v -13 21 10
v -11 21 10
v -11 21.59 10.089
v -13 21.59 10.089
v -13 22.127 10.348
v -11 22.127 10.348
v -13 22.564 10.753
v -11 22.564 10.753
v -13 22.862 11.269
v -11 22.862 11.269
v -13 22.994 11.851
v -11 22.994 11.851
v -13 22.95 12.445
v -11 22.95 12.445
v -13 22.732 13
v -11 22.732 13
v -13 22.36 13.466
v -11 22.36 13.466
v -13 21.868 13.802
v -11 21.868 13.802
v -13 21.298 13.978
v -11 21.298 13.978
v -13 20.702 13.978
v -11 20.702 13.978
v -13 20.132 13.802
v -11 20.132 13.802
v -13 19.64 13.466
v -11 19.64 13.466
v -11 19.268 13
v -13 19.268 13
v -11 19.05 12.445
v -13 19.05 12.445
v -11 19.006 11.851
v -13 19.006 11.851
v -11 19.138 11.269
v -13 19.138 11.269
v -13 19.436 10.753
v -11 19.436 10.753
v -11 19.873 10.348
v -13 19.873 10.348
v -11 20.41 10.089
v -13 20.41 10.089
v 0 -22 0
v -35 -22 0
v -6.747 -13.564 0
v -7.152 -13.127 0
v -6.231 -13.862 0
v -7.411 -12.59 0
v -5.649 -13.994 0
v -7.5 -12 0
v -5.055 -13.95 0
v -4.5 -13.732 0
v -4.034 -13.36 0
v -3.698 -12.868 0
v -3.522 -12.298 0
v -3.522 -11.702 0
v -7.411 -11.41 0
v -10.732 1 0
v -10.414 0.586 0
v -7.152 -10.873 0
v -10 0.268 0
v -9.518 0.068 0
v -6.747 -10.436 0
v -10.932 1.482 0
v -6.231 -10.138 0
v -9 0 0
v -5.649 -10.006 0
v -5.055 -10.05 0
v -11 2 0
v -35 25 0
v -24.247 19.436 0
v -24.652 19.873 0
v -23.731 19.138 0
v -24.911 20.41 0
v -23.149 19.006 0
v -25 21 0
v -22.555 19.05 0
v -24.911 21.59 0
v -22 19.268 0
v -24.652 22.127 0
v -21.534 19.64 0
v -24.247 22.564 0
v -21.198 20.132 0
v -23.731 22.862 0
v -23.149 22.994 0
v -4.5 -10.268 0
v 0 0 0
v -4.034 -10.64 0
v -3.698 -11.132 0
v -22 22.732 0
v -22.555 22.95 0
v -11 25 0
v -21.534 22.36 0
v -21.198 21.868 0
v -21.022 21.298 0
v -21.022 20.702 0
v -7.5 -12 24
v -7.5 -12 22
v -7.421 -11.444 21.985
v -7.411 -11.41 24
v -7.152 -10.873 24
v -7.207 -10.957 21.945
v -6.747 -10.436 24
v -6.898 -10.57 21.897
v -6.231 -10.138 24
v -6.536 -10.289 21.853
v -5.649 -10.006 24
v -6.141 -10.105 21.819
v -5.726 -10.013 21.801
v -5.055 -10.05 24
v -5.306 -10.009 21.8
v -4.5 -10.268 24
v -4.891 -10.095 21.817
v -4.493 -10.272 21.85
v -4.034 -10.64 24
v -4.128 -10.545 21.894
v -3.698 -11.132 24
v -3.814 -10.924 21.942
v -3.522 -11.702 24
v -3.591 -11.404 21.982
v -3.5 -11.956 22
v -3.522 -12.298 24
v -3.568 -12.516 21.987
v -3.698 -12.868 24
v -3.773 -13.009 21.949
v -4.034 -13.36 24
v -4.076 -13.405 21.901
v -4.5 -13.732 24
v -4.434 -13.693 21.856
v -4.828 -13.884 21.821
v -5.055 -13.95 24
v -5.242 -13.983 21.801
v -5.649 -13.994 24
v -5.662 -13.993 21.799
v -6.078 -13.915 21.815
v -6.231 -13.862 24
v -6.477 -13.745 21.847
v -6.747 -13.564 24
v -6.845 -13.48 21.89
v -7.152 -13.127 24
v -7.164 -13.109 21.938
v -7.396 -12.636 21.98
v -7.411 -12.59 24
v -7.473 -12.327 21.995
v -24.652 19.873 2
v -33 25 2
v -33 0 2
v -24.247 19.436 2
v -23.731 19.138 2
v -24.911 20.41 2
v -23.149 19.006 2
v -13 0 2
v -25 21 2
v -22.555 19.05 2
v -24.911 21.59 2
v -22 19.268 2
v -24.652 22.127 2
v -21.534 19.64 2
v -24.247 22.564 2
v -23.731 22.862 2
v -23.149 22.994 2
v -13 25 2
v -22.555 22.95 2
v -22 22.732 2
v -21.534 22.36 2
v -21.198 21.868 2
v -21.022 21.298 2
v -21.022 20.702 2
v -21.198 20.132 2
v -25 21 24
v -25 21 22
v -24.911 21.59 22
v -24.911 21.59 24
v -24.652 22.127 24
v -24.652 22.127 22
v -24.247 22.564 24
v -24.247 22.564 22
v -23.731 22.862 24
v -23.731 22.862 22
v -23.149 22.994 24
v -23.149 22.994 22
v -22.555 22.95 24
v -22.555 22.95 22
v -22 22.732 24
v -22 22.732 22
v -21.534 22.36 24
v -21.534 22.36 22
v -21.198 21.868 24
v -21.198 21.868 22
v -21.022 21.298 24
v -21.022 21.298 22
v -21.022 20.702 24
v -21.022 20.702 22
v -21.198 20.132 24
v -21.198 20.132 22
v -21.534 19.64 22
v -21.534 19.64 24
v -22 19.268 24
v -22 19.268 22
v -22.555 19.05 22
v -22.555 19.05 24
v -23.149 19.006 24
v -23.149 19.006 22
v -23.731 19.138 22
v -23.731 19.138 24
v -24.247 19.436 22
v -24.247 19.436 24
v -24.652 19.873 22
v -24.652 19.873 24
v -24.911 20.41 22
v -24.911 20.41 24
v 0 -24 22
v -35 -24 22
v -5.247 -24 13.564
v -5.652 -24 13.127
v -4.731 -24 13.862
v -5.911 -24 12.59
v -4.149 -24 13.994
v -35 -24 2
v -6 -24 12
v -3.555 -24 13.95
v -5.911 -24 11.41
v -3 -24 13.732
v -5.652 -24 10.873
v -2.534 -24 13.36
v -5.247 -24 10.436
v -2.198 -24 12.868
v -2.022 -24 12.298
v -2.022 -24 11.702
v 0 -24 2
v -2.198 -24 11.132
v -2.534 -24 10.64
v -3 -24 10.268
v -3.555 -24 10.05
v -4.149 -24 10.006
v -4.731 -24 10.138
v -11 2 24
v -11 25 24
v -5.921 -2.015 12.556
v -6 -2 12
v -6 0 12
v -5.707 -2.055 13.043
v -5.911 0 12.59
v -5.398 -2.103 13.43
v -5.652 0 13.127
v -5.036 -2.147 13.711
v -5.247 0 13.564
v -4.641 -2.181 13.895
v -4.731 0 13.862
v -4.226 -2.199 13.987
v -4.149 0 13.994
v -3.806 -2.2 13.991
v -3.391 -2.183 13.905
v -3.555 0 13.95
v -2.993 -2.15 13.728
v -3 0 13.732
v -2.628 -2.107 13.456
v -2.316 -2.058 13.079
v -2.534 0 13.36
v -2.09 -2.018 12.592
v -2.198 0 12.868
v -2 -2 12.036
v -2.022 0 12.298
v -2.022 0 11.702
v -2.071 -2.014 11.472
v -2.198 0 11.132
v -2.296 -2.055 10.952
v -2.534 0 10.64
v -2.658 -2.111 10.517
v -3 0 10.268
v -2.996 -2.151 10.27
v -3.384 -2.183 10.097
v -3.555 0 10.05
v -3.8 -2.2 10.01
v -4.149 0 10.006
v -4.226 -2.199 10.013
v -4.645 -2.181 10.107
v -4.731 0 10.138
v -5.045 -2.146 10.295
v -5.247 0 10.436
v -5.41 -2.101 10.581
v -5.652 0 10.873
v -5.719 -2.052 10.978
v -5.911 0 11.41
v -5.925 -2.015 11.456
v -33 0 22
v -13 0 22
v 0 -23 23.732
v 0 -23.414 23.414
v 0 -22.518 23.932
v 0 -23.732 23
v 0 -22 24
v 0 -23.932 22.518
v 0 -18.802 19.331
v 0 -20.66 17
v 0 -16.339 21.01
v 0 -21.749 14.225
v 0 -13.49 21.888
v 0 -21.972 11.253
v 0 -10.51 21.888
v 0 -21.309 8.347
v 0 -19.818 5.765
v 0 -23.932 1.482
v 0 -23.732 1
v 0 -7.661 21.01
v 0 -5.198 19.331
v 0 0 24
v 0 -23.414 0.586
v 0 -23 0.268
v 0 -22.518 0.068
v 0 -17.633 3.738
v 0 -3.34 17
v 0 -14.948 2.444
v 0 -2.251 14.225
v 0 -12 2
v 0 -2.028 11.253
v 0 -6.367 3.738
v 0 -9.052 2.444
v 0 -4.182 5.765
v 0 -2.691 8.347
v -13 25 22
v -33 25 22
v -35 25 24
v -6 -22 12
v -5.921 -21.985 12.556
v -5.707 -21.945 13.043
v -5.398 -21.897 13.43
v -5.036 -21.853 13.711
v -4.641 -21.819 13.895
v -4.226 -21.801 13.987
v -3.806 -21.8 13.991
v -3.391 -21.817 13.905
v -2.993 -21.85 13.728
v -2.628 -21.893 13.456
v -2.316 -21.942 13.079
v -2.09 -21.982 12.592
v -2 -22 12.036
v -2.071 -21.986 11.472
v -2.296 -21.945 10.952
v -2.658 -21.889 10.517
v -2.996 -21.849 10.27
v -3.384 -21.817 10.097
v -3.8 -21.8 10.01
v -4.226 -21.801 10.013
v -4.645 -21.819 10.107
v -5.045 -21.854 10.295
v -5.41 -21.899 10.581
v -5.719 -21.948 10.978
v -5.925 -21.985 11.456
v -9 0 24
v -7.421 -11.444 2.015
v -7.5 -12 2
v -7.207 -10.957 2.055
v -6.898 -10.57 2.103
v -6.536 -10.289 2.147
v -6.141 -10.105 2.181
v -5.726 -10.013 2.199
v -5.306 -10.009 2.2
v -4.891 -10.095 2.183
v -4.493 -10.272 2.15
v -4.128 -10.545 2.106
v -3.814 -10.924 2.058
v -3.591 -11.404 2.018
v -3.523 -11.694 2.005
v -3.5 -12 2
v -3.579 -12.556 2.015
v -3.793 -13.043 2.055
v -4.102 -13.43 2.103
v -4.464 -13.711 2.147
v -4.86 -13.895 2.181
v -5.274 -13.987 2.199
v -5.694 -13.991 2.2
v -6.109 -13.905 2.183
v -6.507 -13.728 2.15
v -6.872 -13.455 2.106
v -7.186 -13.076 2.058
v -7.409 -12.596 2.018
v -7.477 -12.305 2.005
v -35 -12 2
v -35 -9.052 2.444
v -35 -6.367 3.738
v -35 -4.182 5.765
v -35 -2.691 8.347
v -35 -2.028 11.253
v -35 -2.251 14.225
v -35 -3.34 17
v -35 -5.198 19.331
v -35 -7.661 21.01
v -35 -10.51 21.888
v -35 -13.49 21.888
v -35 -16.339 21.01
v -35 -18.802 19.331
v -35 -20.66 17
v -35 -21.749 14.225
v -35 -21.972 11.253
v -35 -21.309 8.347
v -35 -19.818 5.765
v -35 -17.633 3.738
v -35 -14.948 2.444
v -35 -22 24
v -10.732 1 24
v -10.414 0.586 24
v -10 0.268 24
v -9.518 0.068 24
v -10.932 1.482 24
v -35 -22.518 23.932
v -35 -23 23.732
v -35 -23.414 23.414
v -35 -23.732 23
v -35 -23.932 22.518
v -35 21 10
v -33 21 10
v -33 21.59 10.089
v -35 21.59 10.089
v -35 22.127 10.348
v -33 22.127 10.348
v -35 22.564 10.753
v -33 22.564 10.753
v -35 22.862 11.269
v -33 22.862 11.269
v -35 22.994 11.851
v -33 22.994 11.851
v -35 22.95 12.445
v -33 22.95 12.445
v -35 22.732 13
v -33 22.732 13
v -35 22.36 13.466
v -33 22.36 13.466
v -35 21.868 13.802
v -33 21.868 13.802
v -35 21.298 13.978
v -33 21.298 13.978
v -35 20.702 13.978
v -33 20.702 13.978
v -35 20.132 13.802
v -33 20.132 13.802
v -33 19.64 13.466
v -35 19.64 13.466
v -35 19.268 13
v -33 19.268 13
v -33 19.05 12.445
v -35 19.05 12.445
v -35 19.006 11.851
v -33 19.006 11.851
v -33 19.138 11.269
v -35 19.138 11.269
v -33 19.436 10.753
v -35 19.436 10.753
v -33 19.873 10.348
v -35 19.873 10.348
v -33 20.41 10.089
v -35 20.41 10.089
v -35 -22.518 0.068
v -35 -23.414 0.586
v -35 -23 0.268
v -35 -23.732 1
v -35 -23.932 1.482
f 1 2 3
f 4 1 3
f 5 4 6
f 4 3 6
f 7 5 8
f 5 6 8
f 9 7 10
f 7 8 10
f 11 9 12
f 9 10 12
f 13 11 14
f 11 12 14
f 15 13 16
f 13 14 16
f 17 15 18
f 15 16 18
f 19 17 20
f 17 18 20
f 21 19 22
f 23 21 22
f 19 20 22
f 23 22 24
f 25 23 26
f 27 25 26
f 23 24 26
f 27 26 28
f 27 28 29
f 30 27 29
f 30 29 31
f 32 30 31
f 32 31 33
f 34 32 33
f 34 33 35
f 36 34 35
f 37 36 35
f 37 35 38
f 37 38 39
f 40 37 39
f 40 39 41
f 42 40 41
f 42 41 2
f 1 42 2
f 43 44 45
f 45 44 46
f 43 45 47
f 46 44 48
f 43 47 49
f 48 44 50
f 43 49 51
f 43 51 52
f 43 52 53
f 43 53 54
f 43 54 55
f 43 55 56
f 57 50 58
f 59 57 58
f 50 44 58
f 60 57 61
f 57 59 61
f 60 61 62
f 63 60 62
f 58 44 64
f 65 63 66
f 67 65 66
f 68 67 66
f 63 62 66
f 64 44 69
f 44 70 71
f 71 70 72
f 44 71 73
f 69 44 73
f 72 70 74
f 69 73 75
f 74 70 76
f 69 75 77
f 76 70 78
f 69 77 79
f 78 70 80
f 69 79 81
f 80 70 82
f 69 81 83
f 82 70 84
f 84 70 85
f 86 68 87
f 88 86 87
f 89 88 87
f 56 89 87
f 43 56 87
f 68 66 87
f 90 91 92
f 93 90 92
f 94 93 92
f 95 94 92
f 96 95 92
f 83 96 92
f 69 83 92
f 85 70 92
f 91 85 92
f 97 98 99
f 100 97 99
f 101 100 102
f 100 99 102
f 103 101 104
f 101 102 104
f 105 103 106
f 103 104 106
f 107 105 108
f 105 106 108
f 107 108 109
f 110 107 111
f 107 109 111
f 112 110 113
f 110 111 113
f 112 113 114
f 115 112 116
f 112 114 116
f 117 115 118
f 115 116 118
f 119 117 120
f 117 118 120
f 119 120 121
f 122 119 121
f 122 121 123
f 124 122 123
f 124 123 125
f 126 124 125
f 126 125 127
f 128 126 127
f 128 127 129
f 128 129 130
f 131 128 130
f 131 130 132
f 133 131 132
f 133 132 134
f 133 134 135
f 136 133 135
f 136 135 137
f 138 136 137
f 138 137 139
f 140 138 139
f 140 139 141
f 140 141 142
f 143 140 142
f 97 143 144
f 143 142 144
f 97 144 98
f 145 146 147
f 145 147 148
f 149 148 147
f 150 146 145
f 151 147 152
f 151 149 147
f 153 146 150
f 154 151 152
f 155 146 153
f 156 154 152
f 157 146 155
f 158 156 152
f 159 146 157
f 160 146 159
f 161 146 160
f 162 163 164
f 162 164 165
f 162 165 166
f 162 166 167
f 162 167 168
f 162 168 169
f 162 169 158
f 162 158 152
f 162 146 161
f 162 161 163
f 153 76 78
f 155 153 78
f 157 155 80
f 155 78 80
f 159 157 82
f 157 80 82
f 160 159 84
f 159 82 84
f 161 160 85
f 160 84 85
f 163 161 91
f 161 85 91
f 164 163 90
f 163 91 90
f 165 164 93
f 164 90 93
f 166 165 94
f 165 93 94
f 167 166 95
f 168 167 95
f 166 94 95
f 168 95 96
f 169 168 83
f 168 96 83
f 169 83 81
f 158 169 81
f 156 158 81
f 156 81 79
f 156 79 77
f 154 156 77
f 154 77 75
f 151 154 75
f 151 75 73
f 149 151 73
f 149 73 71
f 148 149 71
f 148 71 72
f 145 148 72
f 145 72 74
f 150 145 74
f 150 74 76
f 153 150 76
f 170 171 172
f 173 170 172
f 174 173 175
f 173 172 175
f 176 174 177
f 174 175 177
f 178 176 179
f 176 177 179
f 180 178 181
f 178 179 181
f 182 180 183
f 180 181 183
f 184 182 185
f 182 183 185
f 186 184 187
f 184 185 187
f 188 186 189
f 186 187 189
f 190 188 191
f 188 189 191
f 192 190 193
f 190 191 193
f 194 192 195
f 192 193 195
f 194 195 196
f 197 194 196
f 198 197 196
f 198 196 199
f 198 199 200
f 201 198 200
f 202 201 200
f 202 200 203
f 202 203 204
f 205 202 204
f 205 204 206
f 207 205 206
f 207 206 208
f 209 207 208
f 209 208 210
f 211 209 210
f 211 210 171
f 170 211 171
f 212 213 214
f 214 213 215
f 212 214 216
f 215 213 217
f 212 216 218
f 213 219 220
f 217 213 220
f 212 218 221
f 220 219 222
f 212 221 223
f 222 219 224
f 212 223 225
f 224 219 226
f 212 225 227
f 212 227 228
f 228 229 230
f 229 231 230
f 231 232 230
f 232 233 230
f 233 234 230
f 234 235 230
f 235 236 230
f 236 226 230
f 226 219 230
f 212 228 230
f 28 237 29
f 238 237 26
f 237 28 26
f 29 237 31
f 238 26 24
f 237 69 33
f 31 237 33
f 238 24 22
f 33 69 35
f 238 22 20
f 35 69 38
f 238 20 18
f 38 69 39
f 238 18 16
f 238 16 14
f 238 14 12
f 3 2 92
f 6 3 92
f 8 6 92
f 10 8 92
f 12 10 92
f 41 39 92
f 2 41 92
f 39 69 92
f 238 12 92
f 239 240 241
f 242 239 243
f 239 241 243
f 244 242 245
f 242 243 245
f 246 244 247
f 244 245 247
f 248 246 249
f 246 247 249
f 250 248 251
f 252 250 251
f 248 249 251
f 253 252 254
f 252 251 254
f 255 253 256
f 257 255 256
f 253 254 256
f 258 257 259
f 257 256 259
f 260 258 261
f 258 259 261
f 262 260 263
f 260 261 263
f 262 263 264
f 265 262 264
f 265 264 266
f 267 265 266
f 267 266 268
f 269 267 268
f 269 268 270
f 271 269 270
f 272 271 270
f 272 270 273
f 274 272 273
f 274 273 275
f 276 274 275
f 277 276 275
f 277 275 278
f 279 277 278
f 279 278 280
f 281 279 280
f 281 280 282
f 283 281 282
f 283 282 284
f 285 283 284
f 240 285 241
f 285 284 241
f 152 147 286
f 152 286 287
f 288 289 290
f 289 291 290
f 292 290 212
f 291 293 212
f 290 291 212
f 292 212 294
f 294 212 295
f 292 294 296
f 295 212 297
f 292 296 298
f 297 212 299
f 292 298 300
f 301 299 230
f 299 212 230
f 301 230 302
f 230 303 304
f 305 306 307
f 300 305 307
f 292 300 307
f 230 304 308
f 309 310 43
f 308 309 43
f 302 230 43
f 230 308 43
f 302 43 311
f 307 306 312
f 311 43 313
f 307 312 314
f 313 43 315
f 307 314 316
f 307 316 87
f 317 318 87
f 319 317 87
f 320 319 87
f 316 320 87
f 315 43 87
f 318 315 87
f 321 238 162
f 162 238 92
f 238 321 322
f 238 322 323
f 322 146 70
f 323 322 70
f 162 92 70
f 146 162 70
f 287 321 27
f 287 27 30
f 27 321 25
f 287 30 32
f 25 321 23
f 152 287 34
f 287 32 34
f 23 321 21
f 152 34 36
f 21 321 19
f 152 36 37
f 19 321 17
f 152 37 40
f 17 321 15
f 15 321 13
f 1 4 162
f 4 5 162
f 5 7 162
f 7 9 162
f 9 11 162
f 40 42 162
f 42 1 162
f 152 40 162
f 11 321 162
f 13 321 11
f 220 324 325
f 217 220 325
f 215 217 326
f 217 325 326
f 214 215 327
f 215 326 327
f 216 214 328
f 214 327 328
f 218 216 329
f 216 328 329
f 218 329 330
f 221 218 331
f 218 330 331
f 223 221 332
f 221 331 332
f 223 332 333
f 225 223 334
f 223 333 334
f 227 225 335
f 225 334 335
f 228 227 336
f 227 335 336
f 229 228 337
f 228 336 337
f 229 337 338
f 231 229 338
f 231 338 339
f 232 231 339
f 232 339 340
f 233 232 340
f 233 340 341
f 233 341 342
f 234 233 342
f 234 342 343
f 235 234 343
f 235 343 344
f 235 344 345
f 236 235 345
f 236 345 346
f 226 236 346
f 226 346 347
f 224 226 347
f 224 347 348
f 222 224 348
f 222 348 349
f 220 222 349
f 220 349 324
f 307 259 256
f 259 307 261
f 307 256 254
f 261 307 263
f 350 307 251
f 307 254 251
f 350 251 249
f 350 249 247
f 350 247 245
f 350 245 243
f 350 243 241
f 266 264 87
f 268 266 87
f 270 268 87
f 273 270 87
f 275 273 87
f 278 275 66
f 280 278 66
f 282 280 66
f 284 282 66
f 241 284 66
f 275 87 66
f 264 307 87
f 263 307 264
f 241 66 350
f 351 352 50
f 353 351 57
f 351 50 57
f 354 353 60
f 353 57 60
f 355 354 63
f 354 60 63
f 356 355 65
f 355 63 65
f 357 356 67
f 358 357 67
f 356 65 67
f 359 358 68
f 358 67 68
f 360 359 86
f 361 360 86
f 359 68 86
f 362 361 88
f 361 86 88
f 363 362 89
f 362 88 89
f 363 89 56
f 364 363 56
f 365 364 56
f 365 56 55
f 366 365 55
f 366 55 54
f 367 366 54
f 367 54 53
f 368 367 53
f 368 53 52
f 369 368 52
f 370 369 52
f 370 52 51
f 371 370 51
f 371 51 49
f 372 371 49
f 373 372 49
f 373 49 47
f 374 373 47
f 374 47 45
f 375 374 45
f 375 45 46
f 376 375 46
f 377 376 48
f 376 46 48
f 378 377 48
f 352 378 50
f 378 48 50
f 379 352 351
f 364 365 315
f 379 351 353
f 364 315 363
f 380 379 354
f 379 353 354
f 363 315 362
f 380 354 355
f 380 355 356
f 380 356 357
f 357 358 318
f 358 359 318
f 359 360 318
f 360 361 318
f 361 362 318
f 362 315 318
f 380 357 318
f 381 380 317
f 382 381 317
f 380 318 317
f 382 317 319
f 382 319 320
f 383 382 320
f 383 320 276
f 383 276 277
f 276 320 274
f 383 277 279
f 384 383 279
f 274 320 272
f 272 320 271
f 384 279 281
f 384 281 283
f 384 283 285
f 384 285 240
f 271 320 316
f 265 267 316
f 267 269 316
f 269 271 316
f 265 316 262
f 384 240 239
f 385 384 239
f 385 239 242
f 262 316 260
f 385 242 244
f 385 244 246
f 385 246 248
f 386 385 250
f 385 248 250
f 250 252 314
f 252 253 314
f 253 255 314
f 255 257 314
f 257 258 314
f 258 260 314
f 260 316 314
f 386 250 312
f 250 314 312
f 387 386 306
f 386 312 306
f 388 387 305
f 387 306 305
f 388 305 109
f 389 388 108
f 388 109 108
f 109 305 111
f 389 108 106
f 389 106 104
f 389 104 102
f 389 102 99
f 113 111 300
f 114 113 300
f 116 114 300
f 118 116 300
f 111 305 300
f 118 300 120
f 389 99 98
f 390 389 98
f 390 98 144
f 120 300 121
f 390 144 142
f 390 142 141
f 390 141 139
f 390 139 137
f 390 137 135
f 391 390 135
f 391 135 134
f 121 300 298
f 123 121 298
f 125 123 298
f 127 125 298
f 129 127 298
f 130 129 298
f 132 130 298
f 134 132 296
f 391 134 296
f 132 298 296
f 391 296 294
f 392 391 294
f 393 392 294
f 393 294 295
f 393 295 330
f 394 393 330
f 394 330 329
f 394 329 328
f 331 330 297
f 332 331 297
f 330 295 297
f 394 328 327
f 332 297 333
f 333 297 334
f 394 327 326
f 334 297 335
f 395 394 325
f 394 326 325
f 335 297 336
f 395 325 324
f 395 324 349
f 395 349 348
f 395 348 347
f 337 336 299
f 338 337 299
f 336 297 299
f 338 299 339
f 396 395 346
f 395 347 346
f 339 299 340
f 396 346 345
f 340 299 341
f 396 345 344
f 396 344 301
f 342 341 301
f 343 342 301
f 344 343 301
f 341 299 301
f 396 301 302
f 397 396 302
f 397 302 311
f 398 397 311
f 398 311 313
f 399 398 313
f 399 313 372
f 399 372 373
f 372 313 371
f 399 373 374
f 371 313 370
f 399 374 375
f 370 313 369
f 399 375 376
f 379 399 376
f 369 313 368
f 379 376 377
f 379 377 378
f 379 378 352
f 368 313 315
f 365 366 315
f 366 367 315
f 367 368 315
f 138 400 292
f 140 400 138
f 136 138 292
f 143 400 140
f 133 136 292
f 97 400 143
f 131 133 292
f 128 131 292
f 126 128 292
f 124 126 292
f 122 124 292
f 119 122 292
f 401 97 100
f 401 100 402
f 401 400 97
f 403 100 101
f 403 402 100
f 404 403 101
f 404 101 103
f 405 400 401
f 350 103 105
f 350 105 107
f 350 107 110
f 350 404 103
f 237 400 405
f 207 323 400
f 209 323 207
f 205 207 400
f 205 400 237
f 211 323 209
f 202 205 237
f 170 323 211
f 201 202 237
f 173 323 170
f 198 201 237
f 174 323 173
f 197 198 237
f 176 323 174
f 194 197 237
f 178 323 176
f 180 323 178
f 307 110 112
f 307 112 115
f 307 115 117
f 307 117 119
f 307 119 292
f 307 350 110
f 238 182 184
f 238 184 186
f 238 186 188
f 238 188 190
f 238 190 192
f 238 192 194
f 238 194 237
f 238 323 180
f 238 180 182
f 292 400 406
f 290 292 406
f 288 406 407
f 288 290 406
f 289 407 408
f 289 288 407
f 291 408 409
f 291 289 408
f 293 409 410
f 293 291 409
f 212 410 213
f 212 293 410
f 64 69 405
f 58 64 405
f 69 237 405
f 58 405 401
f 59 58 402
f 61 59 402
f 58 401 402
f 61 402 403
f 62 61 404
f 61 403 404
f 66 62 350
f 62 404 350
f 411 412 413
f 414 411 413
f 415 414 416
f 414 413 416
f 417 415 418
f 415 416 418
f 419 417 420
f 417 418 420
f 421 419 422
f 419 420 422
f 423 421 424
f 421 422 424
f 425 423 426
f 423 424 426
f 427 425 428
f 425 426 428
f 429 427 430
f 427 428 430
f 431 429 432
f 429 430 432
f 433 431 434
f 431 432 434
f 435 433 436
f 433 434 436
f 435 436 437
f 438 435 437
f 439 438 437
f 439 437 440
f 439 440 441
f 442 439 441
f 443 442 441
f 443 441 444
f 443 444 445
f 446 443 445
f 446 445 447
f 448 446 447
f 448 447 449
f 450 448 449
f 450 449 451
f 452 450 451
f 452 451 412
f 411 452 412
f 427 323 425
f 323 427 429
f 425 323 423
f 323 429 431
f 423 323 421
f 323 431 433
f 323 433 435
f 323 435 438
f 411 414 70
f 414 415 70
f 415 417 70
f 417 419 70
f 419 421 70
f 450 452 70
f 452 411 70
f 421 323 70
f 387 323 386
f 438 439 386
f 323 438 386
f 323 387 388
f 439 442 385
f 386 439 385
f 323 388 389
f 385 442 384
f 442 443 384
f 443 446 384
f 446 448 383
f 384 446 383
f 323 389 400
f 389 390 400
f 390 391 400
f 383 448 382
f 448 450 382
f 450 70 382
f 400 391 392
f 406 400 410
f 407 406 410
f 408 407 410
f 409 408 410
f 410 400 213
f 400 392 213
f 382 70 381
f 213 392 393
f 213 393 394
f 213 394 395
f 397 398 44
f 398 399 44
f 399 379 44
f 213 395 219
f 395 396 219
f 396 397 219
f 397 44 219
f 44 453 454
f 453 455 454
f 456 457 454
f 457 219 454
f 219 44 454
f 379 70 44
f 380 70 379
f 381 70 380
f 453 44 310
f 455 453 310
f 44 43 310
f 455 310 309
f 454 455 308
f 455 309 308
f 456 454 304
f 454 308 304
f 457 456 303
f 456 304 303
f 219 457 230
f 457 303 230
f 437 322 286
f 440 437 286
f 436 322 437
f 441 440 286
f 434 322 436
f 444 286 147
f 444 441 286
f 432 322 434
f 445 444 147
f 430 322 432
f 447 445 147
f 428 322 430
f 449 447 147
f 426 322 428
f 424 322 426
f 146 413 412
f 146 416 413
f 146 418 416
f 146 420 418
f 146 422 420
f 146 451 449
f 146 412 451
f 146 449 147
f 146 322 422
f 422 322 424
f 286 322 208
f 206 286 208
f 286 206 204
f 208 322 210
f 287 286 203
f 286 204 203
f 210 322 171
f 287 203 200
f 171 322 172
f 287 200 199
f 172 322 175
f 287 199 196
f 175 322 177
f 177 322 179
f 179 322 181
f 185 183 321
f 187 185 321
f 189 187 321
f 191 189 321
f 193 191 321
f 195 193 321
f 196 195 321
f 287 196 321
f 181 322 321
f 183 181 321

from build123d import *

# Parameters (mm, degrees)
BOSS_EXTRUDE1_DEPTH = 24
SKETCH2_W           = 20
SKETCH2_H           = 20
CUT_EXTRUDE2_DEPTH  = 25
SKETCH3_R           = 10
CUT_EXTRUDE3_DEPTH  = 50.254441424
SKETCH4_R           = 2
CUT_EXTRUDE4_DEPTH  = 25
SKETCH5_R           = 2
CUT_EXTRUDE5_DEPTH  = 25
SKETCH6_R           = 2
CUT_EXTRUDE6_DEPTH  = 25
SKETCH7_R           = 2
CUT_EXTRUDE7_DEPTH  = 25
FILLET1_R           = 2


with BuildPart() as part:
    # Sketch1 → Boss-Extrude1 (new body)
    with BuildSketch(Plane.XY):
        Polygon((-35, 25), (-35, -24), (0, -24), (0, 0), (-11, 0), (-11, 25), align=None)
    extrude(amount=BOSS_EXTRUDE1_DEPTH)

    # Sketch2 → Cut-Extrude2 (cut)
    with BuildSketch(Plane(origin=(0, 25, 0), x_dir=(1, 0, 0), z_dir=(0, 1, 0))):
        with Locations((-23, -12)):
            Rectangle(SKETCH2_W, SKETCH2_H)
    extrude(amount=-CUT_EXTRUDE2_DEPTH, mode=Mode.SUBTRACT)

    # Sketch3 → Cut-Extrude3 (cut, through all)
    with BuildSketch(Plane(origin=(0, 0, 0), x_dir=(0, 0, -1), z_dir=(1, 0, 0))):
        with Locations((-12, -12)):
            Circle(SKETCH3_R)
    extrude(amount=-CUT_EXTRUDE3_DEPTH, mode=Mode.SUBTRACT)

    # Sketch4 → Cut-Extrude4 (cut)
    with BuildSketch(Plane(origin=(-11, 0, 0), x_dir=(0, 0, -1), z_dir=(1, 0, 0))):
        with Locations((-12, 21)):
            Circle(SKETCH4_R)
    extrude(amount=-CUT_EXTRUDE4_DEPTH, mode=Mode.SUBTRACT)

    # Sketch5 → Cut-Extrude5 (cut)
    with BuildSketch(Plane(origin=(0, 0, 0), x_dir=(-1, 0, 0), z_dir=(0, 0, -1))):
        with Locations((23, 21)):
            Circle(SKETCH5_R)
    extrude(amount=-CUT_EXTRUDE5_DEPTH, mode=Mode.SUBTRACT)

    # Sketch6 → Cut-Extrude6 (cut)
    with BuildSketch(Plane(origin=(0, 0, 0), x_dir=(1, 0, 0), z_dir=(0, 1, 0))):
        with Locations(Location((-4, -12, 0), (0, 0, 180))):
            Circle(SKETCH6_R)
    extrude(amount=-CUT_EXTRUDE6_DEPTH, mode=Mode.SUBTRACT)

    # Sketch7 → Cut-Extrude7 (cut)
    with BuildSketch(Plane(origin=(0, 0, 0), x_dir=(-1, 0, 0), z_dir=(0, 0, -1))):
        with Locations((5.5, -12)):
            Circle(SKETCH7_R)
    extrude(amount=-CUT_EXTRUDE7_DEPTH, mode=Mode.SUBTRACT)

    # Fillet1
    fillet1_edges = [part.edges().sort_by_distance(p)[0] for p in [
        (-11, 0, 12),
        (-17.5, -24, 24),
        (-17.5, -24, 0),
    ]]
    fillet(fillet1_edges, radius=FILLET1_R)


solid = part.part
